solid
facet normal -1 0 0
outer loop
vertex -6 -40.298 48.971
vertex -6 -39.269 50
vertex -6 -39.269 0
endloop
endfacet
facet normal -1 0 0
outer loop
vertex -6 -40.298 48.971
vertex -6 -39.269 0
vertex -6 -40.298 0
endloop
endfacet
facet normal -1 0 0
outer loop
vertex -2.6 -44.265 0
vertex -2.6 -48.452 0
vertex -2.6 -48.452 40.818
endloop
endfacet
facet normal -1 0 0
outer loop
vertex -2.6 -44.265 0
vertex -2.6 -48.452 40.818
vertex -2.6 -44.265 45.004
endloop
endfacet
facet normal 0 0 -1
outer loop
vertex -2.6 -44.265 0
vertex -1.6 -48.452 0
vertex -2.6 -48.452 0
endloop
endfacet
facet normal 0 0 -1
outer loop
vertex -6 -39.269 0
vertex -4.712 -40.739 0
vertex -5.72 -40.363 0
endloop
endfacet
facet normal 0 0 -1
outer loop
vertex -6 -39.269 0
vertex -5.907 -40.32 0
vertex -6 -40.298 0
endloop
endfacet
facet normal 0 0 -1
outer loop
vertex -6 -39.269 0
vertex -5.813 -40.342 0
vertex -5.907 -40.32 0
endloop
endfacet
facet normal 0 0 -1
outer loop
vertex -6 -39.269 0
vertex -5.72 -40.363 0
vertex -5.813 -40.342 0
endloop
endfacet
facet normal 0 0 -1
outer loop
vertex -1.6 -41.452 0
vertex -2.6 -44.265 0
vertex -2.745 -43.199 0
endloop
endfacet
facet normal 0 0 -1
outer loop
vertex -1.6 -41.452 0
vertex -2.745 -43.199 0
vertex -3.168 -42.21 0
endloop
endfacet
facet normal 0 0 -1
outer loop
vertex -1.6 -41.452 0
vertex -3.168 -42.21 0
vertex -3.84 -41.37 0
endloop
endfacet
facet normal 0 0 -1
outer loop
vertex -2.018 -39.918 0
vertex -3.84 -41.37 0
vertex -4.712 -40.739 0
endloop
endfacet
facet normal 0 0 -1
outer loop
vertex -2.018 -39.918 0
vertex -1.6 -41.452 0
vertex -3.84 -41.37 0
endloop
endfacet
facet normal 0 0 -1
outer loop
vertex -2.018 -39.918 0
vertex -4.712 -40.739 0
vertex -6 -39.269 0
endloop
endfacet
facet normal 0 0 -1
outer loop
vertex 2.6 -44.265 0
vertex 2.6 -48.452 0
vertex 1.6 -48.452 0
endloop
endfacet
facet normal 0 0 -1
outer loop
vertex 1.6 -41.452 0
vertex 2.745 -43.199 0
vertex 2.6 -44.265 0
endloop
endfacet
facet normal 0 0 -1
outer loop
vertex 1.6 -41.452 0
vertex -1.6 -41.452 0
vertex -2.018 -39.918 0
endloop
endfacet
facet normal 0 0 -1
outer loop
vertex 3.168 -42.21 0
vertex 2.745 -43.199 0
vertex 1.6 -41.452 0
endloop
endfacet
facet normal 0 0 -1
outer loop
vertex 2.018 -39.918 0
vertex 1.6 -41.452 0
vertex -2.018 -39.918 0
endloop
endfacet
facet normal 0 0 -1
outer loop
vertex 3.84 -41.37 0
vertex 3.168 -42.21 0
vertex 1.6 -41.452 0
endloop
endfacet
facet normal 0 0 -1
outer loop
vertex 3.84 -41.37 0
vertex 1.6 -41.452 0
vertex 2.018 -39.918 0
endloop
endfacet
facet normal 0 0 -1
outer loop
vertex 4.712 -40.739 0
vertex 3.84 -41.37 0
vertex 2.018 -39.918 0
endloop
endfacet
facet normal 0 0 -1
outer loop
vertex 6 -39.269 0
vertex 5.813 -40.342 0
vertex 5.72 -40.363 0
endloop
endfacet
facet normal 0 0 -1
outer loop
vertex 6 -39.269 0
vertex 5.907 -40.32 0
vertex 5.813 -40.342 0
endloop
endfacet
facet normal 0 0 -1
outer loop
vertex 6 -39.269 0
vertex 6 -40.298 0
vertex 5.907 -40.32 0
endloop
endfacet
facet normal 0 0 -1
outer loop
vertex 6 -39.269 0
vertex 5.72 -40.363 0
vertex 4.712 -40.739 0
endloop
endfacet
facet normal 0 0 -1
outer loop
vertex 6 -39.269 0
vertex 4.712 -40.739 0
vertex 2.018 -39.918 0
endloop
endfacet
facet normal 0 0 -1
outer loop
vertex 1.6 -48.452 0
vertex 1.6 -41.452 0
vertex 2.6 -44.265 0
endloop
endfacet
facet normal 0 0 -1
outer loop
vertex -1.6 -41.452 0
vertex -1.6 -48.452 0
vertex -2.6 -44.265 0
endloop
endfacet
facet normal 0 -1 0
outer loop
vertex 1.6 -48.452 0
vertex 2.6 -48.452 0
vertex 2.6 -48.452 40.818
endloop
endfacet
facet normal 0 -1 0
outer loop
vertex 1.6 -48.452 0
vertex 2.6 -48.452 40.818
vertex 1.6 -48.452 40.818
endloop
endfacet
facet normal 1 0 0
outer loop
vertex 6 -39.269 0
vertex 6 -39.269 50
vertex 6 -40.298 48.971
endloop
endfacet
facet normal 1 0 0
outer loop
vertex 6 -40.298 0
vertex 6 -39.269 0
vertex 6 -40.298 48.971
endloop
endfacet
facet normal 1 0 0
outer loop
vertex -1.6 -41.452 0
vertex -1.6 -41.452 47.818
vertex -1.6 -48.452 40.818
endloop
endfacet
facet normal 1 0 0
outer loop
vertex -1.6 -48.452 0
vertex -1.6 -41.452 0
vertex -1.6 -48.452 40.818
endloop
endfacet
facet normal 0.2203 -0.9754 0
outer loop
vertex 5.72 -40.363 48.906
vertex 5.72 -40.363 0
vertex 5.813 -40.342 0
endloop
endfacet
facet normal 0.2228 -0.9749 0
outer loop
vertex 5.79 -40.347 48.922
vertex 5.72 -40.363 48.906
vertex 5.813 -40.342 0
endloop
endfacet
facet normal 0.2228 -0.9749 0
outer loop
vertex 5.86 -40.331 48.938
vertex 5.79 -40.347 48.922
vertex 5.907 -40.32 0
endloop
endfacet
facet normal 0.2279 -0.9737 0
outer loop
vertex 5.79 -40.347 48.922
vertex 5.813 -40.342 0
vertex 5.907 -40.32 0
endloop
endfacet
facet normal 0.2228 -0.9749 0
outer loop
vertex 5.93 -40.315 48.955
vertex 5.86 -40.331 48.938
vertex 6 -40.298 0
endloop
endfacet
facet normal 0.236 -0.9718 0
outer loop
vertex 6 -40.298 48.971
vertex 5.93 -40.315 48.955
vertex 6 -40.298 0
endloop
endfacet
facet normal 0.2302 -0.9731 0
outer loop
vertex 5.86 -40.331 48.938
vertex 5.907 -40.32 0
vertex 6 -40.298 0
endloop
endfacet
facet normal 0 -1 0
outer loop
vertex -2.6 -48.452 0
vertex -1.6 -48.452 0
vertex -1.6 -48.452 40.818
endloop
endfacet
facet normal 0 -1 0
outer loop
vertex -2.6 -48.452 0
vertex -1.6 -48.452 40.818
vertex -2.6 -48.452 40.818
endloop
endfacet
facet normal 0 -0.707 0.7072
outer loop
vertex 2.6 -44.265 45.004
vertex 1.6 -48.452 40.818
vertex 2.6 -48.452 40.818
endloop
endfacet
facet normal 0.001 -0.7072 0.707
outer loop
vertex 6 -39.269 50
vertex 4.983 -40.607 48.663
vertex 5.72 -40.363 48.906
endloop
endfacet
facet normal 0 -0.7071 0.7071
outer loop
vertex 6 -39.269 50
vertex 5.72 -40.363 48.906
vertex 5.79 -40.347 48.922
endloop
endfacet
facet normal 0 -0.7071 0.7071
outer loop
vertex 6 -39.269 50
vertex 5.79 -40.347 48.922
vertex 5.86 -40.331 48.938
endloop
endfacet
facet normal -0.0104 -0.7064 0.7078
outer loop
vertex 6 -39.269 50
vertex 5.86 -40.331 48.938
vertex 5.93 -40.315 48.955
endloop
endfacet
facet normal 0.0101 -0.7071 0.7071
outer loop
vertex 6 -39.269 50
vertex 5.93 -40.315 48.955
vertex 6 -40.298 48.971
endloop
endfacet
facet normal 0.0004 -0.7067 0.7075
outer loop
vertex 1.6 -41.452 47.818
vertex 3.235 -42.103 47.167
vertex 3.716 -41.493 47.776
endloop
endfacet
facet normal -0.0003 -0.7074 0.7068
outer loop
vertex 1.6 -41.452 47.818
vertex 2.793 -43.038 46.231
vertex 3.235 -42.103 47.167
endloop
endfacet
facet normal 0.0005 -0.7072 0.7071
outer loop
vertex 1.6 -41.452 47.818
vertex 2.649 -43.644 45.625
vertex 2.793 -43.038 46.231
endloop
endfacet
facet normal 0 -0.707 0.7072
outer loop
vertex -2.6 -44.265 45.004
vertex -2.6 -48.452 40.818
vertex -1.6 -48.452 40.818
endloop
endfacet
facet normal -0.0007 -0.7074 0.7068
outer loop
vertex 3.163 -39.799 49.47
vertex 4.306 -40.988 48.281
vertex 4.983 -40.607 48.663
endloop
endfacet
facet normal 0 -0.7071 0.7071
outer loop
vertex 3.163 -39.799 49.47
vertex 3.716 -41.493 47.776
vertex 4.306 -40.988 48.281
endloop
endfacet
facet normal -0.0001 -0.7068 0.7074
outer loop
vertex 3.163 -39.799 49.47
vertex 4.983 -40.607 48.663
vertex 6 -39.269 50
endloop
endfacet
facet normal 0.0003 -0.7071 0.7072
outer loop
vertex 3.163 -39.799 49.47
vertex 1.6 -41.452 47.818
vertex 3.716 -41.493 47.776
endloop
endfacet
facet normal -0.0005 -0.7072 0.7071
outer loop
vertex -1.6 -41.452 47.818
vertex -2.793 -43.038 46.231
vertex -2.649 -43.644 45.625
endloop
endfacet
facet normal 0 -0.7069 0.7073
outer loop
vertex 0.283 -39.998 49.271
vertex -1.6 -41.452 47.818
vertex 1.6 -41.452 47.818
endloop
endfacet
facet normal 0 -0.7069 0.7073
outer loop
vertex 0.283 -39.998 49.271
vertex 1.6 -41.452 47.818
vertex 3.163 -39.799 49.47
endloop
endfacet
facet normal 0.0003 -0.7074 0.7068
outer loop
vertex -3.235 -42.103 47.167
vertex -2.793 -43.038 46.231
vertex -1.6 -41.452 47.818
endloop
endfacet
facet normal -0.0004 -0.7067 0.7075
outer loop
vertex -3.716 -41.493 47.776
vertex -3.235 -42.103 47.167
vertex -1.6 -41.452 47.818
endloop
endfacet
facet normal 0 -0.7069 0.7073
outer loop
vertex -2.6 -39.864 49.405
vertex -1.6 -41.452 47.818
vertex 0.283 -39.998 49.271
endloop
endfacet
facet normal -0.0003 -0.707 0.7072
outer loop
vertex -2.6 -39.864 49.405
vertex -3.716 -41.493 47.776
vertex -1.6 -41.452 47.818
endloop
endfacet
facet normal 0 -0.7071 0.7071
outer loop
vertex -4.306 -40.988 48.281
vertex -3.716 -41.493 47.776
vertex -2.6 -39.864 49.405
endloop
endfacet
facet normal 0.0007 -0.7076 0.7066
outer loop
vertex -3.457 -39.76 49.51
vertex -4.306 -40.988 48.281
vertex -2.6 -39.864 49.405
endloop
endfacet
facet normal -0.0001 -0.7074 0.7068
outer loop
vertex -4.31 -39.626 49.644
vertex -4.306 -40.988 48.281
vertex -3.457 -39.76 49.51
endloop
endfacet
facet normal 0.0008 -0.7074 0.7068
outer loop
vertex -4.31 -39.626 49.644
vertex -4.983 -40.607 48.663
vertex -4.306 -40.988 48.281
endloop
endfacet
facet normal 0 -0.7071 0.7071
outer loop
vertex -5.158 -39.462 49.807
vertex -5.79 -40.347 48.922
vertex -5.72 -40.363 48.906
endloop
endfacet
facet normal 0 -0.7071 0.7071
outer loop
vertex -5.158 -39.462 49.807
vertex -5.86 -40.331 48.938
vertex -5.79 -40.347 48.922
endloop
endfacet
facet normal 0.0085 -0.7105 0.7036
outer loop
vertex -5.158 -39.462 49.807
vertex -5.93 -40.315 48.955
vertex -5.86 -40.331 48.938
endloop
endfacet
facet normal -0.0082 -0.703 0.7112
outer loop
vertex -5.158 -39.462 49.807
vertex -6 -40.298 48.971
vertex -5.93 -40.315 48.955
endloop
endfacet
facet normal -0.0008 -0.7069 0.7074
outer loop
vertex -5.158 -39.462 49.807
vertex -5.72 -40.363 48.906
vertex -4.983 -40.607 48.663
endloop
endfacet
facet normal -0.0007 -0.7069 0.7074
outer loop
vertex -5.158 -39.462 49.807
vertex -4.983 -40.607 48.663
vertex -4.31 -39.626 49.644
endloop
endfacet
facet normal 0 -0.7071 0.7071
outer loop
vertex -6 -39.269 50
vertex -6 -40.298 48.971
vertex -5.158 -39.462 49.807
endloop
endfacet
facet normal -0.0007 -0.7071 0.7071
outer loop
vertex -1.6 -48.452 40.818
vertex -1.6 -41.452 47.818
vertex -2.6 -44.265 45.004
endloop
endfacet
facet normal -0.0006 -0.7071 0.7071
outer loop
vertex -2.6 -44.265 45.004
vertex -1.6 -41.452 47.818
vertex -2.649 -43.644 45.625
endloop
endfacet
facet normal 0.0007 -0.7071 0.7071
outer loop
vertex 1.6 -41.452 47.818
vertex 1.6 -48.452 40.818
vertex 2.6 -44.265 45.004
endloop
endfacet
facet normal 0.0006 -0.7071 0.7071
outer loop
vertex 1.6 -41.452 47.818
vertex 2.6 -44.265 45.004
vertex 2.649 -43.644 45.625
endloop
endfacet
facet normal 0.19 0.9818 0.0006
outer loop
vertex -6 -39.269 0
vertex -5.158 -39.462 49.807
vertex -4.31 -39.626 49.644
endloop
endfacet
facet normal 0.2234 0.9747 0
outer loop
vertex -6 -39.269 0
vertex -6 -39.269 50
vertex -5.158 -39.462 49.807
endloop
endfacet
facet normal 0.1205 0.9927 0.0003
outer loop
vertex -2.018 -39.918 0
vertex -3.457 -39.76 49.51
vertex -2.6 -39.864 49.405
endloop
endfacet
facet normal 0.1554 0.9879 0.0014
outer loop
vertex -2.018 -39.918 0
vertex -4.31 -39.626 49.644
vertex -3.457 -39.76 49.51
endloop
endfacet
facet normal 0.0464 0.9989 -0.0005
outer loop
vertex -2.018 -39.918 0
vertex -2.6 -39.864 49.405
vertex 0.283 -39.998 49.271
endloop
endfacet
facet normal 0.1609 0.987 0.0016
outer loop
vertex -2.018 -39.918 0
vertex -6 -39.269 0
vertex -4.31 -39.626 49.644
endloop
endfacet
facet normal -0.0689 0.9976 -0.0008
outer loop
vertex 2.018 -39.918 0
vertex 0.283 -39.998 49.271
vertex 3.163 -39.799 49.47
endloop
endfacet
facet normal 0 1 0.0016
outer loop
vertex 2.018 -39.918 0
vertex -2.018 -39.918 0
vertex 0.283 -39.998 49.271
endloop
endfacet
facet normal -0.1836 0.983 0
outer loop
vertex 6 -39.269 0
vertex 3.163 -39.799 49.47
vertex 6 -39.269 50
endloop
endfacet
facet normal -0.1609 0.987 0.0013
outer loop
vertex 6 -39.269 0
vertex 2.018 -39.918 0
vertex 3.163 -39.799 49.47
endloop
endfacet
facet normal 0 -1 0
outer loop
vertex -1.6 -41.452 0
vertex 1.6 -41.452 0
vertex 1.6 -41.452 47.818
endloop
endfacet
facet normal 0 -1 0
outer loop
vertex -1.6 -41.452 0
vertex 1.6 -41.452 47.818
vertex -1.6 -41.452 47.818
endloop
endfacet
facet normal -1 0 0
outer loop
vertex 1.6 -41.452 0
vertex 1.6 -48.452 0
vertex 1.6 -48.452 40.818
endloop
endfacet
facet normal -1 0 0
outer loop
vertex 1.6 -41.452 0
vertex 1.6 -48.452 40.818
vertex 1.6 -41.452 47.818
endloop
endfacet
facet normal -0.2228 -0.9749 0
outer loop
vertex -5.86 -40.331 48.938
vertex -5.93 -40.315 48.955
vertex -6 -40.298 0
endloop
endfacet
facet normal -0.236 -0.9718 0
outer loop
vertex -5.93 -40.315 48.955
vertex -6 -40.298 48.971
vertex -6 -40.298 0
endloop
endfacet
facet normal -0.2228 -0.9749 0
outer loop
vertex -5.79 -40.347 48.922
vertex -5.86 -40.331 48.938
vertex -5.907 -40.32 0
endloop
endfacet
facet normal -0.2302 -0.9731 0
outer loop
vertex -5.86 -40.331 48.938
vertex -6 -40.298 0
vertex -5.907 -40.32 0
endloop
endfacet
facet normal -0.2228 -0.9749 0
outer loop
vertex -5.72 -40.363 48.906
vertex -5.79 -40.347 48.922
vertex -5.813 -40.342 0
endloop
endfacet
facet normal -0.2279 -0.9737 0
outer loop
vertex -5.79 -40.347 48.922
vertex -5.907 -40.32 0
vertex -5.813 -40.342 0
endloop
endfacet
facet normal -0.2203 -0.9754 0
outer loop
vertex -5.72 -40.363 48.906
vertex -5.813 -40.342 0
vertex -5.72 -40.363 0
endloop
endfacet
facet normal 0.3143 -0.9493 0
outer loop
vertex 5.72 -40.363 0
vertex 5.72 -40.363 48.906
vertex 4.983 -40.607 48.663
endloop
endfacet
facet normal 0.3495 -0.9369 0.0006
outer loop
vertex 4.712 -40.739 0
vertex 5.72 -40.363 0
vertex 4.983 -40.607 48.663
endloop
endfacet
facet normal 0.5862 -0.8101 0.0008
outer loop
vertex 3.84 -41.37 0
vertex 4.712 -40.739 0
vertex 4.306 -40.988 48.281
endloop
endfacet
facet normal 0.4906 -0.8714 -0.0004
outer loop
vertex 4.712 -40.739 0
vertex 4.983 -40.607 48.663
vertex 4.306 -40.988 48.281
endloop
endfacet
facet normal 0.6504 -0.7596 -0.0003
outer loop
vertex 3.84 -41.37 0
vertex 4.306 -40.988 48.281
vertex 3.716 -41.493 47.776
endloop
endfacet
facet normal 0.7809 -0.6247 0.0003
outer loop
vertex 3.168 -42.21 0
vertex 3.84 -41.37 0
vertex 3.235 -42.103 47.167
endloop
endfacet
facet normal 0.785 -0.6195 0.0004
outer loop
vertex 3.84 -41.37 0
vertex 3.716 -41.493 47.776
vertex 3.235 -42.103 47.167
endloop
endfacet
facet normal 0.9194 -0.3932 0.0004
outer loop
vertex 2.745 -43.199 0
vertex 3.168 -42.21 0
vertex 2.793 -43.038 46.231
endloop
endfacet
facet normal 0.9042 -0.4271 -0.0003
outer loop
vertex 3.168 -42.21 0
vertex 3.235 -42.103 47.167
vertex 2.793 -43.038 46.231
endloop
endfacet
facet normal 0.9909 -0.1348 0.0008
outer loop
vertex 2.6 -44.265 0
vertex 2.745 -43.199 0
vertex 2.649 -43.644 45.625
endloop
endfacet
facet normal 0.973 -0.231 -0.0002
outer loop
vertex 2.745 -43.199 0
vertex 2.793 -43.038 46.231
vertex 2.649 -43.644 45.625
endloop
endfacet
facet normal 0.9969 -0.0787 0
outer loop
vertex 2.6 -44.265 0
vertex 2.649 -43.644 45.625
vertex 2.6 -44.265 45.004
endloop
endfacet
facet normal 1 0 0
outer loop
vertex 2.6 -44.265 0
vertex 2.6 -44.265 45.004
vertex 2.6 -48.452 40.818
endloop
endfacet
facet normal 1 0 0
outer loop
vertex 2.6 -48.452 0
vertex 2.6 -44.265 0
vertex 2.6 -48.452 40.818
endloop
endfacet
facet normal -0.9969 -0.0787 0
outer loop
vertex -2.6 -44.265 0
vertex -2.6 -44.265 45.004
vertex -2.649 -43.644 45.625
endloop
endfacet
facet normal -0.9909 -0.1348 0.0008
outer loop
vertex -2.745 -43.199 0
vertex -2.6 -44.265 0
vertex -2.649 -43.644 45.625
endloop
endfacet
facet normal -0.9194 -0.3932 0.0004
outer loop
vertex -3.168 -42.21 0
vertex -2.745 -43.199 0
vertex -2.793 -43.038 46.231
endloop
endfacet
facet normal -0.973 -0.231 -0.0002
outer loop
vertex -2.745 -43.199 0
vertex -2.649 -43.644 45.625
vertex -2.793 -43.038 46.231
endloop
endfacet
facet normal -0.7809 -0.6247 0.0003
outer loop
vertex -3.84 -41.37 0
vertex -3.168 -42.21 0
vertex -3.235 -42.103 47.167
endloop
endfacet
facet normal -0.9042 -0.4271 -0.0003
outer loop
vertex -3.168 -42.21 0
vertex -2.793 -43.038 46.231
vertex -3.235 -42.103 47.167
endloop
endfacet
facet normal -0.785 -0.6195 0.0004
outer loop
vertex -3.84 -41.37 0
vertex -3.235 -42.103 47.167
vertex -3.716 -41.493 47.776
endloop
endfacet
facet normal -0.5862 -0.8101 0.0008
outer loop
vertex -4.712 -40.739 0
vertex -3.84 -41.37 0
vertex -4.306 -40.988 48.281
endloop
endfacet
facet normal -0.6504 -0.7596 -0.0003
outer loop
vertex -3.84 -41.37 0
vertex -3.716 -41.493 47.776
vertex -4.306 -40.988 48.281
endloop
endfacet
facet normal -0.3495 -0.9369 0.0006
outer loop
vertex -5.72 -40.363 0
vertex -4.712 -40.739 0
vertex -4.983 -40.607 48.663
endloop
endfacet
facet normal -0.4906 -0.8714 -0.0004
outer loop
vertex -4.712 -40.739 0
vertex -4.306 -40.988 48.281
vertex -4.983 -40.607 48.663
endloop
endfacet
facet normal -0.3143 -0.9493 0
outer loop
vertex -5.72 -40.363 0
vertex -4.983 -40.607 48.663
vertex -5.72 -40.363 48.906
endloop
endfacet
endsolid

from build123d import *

# Parameters (mm, degrees)
PAD004_DEPTH            = 50
FILLET003_R             = 4
POCKET003_DEPTH         = 8.601
POCKET003_DEPTH_BACK    = 3.401
BODY005_PLACEMENT_ANGLE = 90


with BuildPart() as part:
    # Sketch008 → Pad004 (new body)
    with BuildSketch(Plane.XY):
        with BuildLine():
            ThreePointArc((24.269322, -6), (25, 0), (24.269322, 6))
            Line((24.269322, 6), (25.298221, 6))
            ThreePointArc((25.869673, 2.6), (25.640366, 4.309482), (25.298221, 6))
            Line((25.869673, 2.6), (33.451654, 2.6))
            Line((33.451654, 2.6), (33.451654, 1.6))
            Line((33.451654, 1.6), (26.451654, 1.6))
            Line((26.451654, 1.6), (26.451654, -1.6))
            Line((26.451654, -1.6), (33.451654, -1.6))
            Line((33.451654, -1.6), (33.451654, -2.6))
            Line((33.451654, -2.6), (25.869673, -2.6))
            ThreePointArc((25.298221, -6), (25.640366, -4.309482), (25.869673, -2.6))
            Line((24.269322, -6), (25.298221, -6))
        make_face()
    extrude(amount=PAD004_DEPTH)

    # Fillet003
    fillet003_edges = [part.edges().sort_by_distance(p)[0] for p in [
        (25.869673, -2.6, 25),
        (25.869673, 2.6, 25),
    ]]
    fillet(fillet003_edges, radius=FILLET003_R)

    # Sketch009 (on Face15 of Fillet003) → Pocket003 (cut, two sides)
    with BuildSketch(Plane.XZ.offset(2.6)) as pocket003_sk:
        Polygon((33.451654, 50), (33.451654, 40.817668), (24.269322, 50), align=None)
    extrude(amount=-POCKET003_DEPTH, mode=Mode.SUBTRACT)
    extrude(pocket003_sk.sketch, amount=POCKET003_DEPTH_BACK, mode=Mode.SUBTRACT)


with BuildPart() as part_1:
    # Body005 placement: moved
    add(part.part.moved(Location((0, -15, 0))).rotate(Axis((0, -15, 0), (0, 0, -1)), BODY005_PLACEMENT_ANGLE))


solid = part_1.part
